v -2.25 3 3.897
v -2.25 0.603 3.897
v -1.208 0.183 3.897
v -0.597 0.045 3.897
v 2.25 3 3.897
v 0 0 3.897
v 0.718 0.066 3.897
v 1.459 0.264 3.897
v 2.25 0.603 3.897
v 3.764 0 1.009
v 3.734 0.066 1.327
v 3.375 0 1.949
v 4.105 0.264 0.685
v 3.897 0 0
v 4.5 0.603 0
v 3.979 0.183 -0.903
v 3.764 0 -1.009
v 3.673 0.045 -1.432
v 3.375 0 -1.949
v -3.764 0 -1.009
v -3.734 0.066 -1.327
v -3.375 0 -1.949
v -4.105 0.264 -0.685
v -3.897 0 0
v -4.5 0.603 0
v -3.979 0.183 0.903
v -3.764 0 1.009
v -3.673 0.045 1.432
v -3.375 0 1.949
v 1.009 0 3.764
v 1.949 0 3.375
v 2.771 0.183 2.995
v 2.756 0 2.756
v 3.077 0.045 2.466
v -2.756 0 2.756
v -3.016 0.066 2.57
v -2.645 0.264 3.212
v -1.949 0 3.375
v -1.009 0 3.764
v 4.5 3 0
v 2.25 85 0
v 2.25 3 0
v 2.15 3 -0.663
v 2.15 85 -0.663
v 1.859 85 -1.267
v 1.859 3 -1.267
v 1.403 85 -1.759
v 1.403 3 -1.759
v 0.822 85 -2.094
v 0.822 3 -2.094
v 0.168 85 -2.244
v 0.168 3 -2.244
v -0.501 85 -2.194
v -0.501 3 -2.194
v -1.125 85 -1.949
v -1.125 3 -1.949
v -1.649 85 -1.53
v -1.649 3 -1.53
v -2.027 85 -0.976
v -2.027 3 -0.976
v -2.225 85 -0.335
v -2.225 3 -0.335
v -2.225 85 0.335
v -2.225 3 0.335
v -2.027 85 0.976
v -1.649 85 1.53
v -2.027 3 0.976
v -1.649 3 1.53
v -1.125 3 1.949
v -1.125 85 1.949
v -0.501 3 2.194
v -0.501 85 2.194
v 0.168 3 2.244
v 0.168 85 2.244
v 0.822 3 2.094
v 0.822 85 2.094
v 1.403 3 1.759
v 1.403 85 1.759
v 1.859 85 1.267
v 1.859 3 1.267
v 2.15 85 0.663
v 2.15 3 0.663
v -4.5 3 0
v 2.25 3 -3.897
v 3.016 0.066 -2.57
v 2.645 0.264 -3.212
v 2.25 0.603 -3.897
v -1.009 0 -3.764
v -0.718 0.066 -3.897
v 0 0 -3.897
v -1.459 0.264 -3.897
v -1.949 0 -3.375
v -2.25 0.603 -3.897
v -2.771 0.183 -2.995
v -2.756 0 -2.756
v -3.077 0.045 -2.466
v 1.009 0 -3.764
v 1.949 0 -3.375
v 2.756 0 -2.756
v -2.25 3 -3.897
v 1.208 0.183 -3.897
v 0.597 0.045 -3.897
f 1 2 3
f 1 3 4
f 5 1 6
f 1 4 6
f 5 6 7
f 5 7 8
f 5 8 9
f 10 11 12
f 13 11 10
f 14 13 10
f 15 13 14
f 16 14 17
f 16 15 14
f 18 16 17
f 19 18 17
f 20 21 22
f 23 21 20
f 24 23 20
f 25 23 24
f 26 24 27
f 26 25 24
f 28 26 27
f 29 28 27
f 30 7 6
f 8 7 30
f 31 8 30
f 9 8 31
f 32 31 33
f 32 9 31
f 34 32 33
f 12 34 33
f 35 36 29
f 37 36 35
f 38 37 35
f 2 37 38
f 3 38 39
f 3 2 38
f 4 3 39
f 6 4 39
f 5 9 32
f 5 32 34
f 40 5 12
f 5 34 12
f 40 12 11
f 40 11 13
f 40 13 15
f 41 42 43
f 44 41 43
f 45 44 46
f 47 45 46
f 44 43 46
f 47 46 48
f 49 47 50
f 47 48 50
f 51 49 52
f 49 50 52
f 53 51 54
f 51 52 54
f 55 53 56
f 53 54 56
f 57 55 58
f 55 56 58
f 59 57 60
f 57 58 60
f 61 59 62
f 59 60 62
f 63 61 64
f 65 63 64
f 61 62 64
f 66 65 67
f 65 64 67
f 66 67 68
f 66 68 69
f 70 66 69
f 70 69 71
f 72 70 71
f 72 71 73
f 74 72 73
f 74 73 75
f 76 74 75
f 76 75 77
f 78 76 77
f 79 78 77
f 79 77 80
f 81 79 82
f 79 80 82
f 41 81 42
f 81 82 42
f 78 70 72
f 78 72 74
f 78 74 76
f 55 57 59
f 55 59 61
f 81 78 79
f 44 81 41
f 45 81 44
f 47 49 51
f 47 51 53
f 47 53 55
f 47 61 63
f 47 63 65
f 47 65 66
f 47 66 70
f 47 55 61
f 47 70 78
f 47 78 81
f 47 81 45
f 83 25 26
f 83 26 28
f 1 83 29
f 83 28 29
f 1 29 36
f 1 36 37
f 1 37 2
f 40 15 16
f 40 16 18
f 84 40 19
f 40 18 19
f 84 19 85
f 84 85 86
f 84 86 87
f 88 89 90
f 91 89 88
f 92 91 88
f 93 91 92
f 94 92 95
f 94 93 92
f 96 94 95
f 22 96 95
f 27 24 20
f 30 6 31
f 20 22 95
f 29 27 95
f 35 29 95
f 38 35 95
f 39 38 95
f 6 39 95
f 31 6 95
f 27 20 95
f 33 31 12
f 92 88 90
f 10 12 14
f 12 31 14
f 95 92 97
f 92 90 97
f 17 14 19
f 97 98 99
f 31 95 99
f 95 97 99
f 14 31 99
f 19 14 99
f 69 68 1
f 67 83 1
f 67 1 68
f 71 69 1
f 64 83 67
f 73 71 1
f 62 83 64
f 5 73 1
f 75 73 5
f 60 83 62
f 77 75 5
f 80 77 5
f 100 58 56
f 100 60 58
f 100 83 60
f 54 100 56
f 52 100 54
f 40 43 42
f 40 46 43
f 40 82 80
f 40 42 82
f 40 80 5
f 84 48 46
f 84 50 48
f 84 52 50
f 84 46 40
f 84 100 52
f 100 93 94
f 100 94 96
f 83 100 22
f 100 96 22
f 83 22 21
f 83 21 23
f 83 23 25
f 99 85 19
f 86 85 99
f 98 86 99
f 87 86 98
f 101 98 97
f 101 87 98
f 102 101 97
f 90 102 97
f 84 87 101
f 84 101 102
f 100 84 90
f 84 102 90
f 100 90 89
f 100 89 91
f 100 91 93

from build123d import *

# Parameters (mm, degrees)
BOSS_EXTRUDE1_DEPTH = 3
SKETCH2_R           = 2.25
BOSS_EXTRUDE2_DEPTH = 82


with BuildPart() as part:
    # Sketch1 → Boss-Extrude1 (new body)
    with BuildSketch(Plane(origin=(0, 0, 0), x_dir=(1, 0, 0), z_dir=(0, 1, 0))):
        Polygon((-4.5, 0), (-2.25, -3.897114317), (2.25, -3.897114317), (4.5, 0), (2.25, 3.897114317), (-2.25, 3.897114317), align=None)
    extrude(amount=BOSS_EXTRUDE1_DEPTH)

    # Sketch2 → Boss-Extrude2 (add)
    with BuildSketch(Plane(origin=(0, 3, 0), x_dir=(1, 0, 0), z_dir=(0, 1, 0))):
        Circle(SKETCH2_R)
    extrude(amount=BOSS_EXTRUDE2_DEPTH)

    # Sketch4 → Cut-Revolve1 (revolve, cut)
    with BuildSketch(Plane(origin=(0, 0, 0), x_dir=(0, 0, -1), z_dir=(1, 0, 0))):
        Polygon((3.897114317, 0), (4.897114317, 1), (4.897114317, 0), align=None)
    revolve(axis=Axis((0, 0, 0), (0, 1, 0)), mode=Mode.SUBTRACT)


solid = part.part
